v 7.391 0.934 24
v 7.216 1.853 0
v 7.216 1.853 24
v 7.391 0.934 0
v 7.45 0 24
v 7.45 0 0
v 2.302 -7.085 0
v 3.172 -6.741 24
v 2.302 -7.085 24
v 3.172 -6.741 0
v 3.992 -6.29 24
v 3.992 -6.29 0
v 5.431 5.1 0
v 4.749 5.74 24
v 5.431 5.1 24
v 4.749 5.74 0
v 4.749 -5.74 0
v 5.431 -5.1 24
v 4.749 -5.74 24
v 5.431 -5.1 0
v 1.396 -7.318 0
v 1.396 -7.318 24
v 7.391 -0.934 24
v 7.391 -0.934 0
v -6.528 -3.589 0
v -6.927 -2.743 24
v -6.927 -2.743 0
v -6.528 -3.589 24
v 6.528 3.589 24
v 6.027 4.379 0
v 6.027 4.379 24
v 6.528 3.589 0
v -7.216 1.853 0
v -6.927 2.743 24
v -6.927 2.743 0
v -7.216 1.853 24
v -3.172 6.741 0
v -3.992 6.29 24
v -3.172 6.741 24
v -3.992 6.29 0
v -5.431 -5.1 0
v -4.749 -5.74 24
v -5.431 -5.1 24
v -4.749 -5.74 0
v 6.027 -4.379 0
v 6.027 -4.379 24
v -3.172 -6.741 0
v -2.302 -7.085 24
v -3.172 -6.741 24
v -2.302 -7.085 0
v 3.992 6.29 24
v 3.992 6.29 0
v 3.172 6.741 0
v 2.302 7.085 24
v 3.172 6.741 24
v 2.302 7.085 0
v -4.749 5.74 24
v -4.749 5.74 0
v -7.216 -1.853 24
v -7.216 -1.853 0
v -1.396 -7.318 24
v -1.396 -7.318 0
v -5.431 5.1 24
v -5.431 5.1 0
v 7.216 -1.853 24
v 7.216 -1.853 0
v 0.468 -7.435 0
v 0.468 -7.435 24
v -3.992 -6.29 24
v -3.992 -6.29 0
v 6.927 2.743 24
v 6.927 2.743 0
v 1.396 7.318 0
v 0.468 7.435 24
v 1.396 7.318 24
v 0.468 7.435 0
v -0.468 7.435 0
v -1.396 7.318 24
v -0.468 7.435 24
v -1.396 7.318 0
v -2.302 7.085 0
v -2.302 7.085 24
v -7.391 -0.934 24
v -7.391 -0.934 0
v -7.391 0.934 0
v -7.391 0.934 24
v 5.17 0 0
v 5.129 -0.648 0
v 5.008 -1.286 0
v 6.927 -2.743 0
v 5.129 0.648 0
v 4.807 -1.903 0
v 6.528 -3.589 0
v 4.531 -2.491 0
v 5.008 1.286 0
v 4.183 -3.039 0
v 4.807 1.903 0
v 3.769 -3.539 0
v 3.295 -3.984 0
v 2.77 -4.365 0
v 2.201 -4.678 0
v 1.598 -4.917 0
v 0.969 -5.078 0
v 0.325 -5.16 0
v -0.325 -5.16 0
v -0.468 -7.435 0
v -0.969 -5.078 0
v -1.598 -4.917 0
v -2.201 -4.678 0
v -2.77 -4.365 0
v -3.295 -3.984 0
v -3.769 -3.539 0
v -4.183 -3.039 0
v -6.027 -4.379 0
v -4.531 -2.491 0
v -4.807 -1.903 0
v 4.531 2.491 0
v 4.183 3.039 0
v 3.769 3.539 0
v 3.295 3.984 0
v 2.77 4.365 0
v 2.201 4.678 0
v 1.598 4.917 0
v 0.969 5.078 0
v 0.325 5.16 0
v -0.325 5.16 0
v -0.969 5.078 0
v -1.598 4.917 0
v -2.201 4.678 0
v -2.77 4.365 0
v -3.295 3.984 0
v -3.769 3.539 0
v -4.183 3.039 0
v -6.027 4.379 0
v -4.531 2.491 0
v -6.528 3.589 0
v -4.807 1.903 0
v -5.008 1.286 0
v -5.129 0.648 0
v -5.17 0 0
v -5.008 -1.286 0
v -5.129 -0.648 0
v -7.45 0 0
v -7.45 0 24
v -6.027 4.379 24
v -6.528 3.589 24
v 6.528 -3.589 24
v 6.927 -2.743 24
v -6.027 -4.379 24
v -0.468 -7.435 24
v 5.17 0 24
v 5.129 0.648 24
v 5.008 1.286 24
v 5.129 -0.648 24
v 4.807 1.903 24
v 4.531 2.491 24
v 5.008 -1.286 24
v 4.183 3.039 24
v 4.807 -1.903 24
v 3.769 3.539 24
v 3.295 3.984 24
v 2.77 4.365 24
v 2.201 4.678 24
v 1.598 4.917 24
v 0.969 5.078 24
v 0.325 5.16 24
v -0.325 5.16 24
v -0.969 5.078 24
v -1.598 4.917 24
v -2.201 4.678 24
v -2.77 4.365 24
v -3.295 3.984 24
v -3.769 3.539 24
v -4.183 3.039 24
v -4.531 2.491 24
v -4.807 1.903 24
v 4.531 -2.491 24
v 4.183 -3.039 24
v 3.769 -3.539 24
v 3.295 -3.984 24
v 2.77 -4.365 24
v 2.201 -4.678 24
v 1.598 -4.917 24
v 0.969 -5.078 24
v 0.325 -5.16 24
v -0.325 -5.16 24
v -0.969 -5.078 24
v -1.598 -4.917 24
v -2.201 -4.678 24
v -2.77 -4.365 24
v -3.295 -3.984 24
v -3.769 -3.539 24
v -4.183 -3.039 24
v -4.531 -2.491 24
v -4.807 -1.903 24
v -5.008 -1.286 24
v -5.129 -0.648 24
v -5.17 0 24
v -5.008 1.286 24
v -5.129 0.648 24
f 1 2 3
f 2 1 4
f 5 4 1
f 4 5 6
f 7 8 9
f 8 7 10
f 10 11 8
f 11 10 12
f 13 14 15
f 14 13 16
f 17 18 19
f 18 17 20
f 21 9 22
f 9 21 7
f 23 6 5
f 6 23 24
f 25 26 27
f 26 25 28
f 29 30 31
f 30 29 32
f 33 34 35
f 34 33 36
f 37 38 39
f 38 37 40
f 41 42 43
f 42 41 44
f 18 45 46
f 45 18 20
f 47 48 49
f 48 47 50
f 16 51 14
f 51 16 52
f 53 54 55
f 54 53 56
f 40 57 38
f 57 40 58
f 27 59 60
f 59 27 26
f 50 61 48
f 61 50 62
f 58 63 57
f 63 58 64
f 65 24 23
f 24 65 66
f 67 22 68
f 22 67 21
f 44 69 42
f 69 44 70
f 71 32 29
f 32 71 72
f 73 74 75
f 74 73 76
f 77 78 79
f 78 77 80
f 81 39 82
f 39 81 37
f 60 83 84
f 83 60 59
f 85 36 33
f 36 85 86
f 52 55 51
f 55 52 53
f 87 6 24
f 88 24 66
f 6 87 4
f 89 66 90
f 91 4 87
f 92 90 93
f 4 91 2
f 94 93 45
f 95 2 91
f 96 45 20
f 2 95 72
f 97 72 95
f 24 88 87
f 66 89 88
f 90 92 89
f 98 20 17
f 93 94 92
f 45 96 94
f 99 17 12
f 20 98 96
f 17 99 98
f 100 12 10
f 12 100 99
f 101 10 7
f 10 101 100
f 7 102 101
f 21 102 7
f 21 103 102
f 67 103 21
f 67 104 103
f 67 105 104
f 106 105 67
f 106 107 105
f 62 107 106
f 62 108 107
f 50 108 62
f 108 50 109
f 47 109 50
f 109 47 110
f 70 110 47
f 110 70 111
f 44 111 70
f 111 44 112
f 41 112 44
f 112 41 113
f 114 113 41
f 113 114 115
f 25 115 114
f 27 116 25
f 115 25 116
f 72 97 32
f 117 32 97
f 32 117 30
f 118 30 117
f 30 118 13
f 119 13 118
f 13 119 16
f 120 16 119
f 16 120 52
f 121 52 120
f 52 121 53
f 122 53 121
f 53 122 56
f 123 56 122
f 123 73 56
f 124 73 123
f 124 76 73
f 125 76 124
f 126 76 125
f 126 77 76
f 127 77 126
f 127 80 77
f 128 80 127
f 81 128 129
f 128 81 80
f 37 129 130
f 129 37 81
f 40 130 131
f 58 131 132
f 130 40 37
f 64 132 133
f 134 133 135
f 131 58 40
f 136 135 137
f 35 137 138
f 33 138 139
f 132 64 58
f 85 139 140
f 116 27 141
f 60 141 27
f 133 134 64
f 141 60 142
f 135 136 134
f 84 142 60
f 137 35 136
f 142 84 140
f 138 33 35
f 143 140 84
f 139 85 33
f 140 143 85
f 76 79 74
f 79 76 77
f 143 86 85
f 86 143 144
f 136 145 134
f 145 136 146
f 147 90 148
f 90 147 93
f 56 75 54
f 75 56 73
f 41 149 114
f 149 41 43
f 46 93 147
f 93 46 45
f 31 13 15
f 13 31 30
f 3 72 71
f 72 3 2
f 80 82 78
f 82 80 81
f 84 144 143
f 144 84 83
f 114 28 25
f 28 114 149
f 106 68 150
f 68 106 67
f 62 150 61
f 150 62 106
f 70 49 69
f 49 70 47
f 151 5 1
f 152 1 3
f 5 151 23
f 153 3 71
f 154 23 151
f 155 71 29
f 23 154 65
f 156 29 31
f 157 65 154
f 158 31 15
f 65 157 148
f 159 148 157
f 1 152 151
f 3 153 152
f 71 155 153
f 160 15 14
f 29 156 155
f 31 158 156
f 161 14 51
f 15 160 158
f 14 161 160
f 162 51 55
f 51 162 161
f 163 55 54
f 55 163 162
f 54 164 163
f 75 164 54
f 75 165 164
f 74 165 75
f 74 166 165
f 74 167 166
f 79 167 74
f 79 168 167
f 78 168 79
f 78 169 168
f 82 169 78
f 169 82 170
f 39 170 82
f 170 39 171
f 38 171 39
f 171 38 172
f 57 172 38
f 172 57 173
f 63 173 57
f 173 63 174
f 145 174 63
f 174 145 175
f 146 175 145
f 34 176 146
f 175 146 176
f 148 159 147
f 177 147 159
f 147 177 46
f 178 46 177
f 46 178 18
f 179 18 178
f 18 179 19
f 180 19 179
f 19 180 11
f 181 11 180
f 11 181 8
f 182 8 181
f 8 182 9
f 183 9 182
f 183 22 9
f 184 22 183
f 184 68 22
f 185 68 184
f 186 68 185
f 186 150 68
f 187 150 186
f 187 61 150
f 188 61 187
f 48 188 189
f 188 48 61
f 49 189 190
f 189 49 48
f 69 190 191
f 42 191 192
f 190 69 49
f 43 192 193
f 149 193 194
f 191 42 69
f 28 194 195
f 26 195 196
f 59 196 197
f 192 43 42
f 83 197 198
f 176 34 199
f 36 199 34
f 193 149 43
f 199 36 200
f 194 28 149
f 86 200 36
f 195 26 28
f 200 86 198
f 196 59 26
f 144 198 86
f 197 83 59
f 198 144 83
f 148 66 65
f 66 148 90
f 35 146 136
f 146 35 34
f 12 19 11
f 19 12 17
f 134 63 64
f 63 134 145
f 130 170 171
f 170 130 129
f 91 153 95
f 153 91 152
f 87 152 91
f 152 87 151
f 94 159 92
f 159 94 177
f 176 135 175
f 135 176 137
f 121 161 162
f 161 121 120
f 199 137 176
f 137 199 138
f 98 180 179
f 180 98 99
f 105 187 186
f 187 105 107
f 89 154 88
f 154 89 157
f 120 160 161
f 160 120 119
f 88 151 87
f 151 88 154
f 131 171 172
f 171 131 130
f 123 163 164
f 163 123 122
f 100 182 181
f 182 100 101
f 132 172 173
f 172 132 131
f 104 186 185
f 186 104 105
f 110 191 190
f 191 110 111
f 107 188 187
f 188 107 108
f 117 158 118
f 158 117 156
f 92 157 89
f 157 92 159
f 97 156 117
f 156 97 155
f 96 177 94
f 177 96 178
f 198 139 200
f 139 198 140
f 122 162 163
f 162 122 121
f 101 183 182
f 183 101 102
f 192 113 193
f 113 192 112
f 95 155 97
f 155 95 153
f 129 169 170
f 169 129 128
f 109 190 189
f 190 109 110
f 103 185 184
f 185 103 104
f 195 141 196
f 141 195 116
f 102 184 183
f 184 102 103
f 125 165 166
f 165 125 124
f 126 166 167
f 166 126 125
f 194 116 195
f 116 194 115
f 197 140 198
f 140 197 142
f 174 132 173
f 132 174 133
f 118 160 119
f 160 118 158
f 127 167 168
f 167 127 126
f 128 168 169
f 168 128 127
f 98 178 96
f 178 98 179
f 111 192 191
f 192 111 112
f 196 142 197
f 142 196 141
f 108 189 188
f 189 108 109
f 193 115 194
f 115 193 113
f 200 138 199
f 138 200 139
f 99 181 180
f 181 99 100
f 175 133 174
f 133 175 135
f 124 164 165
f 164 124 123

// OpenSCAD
//-- Customizable LM8UU graphite impregnated bronze bushing adapter
//-- for use in 3D printers
//-- by AndrewBCN - Barcelona, Spain - June 2015
//-- GPLV3

//-- Based on http://www.thingiverse.com/thing:849572 by Ruff
//-- Also based on http://www.thingiverse.com/thing:166794 by Misan

//-- Bushings must be press-fit in adapter; I recommend cooling down
//-- the bushings by storing them in the fridge for an hour or so

//-- These bushings have slightly more friction than linear bearings,
//-- but they also make a lot less noise.

// The default tolerances below work well for me with these adapters
// printed in PLA on my P3Steel, after slicing with Cura.
// outer diameter adapter bushing tolerance, must be determined empirically (by trial-and-error)
// printed adapter bushing tolerance, must be determined empirically (by trial-and-error)
// YMMV

// Parameters

// Outer diameter tolerance
od_adap_tol=-0.1;  // [-0.3,-0.2,-0.1,0.0]

// Inner diameter tolerance
id_b_tol=0.34; // [0.00:0.60]

/* [Hidden] */
$fn=50;

// Modules

// LM8UU dimensions in mm are od=15 id=8 len=24

// graphite impregnated bronze bushings from AliExpress
// have dimensions in mm od=10 id=8 len=11.7
// Two bushings and this printed adapter are needed to replace each LM8UU

difference() {
cylinder(h=24,r=(15+od_adap_tol)/2);
translate([0,0,-0.1]) cylinder(h=24.2,r=5+id_b_tol/2);
}
